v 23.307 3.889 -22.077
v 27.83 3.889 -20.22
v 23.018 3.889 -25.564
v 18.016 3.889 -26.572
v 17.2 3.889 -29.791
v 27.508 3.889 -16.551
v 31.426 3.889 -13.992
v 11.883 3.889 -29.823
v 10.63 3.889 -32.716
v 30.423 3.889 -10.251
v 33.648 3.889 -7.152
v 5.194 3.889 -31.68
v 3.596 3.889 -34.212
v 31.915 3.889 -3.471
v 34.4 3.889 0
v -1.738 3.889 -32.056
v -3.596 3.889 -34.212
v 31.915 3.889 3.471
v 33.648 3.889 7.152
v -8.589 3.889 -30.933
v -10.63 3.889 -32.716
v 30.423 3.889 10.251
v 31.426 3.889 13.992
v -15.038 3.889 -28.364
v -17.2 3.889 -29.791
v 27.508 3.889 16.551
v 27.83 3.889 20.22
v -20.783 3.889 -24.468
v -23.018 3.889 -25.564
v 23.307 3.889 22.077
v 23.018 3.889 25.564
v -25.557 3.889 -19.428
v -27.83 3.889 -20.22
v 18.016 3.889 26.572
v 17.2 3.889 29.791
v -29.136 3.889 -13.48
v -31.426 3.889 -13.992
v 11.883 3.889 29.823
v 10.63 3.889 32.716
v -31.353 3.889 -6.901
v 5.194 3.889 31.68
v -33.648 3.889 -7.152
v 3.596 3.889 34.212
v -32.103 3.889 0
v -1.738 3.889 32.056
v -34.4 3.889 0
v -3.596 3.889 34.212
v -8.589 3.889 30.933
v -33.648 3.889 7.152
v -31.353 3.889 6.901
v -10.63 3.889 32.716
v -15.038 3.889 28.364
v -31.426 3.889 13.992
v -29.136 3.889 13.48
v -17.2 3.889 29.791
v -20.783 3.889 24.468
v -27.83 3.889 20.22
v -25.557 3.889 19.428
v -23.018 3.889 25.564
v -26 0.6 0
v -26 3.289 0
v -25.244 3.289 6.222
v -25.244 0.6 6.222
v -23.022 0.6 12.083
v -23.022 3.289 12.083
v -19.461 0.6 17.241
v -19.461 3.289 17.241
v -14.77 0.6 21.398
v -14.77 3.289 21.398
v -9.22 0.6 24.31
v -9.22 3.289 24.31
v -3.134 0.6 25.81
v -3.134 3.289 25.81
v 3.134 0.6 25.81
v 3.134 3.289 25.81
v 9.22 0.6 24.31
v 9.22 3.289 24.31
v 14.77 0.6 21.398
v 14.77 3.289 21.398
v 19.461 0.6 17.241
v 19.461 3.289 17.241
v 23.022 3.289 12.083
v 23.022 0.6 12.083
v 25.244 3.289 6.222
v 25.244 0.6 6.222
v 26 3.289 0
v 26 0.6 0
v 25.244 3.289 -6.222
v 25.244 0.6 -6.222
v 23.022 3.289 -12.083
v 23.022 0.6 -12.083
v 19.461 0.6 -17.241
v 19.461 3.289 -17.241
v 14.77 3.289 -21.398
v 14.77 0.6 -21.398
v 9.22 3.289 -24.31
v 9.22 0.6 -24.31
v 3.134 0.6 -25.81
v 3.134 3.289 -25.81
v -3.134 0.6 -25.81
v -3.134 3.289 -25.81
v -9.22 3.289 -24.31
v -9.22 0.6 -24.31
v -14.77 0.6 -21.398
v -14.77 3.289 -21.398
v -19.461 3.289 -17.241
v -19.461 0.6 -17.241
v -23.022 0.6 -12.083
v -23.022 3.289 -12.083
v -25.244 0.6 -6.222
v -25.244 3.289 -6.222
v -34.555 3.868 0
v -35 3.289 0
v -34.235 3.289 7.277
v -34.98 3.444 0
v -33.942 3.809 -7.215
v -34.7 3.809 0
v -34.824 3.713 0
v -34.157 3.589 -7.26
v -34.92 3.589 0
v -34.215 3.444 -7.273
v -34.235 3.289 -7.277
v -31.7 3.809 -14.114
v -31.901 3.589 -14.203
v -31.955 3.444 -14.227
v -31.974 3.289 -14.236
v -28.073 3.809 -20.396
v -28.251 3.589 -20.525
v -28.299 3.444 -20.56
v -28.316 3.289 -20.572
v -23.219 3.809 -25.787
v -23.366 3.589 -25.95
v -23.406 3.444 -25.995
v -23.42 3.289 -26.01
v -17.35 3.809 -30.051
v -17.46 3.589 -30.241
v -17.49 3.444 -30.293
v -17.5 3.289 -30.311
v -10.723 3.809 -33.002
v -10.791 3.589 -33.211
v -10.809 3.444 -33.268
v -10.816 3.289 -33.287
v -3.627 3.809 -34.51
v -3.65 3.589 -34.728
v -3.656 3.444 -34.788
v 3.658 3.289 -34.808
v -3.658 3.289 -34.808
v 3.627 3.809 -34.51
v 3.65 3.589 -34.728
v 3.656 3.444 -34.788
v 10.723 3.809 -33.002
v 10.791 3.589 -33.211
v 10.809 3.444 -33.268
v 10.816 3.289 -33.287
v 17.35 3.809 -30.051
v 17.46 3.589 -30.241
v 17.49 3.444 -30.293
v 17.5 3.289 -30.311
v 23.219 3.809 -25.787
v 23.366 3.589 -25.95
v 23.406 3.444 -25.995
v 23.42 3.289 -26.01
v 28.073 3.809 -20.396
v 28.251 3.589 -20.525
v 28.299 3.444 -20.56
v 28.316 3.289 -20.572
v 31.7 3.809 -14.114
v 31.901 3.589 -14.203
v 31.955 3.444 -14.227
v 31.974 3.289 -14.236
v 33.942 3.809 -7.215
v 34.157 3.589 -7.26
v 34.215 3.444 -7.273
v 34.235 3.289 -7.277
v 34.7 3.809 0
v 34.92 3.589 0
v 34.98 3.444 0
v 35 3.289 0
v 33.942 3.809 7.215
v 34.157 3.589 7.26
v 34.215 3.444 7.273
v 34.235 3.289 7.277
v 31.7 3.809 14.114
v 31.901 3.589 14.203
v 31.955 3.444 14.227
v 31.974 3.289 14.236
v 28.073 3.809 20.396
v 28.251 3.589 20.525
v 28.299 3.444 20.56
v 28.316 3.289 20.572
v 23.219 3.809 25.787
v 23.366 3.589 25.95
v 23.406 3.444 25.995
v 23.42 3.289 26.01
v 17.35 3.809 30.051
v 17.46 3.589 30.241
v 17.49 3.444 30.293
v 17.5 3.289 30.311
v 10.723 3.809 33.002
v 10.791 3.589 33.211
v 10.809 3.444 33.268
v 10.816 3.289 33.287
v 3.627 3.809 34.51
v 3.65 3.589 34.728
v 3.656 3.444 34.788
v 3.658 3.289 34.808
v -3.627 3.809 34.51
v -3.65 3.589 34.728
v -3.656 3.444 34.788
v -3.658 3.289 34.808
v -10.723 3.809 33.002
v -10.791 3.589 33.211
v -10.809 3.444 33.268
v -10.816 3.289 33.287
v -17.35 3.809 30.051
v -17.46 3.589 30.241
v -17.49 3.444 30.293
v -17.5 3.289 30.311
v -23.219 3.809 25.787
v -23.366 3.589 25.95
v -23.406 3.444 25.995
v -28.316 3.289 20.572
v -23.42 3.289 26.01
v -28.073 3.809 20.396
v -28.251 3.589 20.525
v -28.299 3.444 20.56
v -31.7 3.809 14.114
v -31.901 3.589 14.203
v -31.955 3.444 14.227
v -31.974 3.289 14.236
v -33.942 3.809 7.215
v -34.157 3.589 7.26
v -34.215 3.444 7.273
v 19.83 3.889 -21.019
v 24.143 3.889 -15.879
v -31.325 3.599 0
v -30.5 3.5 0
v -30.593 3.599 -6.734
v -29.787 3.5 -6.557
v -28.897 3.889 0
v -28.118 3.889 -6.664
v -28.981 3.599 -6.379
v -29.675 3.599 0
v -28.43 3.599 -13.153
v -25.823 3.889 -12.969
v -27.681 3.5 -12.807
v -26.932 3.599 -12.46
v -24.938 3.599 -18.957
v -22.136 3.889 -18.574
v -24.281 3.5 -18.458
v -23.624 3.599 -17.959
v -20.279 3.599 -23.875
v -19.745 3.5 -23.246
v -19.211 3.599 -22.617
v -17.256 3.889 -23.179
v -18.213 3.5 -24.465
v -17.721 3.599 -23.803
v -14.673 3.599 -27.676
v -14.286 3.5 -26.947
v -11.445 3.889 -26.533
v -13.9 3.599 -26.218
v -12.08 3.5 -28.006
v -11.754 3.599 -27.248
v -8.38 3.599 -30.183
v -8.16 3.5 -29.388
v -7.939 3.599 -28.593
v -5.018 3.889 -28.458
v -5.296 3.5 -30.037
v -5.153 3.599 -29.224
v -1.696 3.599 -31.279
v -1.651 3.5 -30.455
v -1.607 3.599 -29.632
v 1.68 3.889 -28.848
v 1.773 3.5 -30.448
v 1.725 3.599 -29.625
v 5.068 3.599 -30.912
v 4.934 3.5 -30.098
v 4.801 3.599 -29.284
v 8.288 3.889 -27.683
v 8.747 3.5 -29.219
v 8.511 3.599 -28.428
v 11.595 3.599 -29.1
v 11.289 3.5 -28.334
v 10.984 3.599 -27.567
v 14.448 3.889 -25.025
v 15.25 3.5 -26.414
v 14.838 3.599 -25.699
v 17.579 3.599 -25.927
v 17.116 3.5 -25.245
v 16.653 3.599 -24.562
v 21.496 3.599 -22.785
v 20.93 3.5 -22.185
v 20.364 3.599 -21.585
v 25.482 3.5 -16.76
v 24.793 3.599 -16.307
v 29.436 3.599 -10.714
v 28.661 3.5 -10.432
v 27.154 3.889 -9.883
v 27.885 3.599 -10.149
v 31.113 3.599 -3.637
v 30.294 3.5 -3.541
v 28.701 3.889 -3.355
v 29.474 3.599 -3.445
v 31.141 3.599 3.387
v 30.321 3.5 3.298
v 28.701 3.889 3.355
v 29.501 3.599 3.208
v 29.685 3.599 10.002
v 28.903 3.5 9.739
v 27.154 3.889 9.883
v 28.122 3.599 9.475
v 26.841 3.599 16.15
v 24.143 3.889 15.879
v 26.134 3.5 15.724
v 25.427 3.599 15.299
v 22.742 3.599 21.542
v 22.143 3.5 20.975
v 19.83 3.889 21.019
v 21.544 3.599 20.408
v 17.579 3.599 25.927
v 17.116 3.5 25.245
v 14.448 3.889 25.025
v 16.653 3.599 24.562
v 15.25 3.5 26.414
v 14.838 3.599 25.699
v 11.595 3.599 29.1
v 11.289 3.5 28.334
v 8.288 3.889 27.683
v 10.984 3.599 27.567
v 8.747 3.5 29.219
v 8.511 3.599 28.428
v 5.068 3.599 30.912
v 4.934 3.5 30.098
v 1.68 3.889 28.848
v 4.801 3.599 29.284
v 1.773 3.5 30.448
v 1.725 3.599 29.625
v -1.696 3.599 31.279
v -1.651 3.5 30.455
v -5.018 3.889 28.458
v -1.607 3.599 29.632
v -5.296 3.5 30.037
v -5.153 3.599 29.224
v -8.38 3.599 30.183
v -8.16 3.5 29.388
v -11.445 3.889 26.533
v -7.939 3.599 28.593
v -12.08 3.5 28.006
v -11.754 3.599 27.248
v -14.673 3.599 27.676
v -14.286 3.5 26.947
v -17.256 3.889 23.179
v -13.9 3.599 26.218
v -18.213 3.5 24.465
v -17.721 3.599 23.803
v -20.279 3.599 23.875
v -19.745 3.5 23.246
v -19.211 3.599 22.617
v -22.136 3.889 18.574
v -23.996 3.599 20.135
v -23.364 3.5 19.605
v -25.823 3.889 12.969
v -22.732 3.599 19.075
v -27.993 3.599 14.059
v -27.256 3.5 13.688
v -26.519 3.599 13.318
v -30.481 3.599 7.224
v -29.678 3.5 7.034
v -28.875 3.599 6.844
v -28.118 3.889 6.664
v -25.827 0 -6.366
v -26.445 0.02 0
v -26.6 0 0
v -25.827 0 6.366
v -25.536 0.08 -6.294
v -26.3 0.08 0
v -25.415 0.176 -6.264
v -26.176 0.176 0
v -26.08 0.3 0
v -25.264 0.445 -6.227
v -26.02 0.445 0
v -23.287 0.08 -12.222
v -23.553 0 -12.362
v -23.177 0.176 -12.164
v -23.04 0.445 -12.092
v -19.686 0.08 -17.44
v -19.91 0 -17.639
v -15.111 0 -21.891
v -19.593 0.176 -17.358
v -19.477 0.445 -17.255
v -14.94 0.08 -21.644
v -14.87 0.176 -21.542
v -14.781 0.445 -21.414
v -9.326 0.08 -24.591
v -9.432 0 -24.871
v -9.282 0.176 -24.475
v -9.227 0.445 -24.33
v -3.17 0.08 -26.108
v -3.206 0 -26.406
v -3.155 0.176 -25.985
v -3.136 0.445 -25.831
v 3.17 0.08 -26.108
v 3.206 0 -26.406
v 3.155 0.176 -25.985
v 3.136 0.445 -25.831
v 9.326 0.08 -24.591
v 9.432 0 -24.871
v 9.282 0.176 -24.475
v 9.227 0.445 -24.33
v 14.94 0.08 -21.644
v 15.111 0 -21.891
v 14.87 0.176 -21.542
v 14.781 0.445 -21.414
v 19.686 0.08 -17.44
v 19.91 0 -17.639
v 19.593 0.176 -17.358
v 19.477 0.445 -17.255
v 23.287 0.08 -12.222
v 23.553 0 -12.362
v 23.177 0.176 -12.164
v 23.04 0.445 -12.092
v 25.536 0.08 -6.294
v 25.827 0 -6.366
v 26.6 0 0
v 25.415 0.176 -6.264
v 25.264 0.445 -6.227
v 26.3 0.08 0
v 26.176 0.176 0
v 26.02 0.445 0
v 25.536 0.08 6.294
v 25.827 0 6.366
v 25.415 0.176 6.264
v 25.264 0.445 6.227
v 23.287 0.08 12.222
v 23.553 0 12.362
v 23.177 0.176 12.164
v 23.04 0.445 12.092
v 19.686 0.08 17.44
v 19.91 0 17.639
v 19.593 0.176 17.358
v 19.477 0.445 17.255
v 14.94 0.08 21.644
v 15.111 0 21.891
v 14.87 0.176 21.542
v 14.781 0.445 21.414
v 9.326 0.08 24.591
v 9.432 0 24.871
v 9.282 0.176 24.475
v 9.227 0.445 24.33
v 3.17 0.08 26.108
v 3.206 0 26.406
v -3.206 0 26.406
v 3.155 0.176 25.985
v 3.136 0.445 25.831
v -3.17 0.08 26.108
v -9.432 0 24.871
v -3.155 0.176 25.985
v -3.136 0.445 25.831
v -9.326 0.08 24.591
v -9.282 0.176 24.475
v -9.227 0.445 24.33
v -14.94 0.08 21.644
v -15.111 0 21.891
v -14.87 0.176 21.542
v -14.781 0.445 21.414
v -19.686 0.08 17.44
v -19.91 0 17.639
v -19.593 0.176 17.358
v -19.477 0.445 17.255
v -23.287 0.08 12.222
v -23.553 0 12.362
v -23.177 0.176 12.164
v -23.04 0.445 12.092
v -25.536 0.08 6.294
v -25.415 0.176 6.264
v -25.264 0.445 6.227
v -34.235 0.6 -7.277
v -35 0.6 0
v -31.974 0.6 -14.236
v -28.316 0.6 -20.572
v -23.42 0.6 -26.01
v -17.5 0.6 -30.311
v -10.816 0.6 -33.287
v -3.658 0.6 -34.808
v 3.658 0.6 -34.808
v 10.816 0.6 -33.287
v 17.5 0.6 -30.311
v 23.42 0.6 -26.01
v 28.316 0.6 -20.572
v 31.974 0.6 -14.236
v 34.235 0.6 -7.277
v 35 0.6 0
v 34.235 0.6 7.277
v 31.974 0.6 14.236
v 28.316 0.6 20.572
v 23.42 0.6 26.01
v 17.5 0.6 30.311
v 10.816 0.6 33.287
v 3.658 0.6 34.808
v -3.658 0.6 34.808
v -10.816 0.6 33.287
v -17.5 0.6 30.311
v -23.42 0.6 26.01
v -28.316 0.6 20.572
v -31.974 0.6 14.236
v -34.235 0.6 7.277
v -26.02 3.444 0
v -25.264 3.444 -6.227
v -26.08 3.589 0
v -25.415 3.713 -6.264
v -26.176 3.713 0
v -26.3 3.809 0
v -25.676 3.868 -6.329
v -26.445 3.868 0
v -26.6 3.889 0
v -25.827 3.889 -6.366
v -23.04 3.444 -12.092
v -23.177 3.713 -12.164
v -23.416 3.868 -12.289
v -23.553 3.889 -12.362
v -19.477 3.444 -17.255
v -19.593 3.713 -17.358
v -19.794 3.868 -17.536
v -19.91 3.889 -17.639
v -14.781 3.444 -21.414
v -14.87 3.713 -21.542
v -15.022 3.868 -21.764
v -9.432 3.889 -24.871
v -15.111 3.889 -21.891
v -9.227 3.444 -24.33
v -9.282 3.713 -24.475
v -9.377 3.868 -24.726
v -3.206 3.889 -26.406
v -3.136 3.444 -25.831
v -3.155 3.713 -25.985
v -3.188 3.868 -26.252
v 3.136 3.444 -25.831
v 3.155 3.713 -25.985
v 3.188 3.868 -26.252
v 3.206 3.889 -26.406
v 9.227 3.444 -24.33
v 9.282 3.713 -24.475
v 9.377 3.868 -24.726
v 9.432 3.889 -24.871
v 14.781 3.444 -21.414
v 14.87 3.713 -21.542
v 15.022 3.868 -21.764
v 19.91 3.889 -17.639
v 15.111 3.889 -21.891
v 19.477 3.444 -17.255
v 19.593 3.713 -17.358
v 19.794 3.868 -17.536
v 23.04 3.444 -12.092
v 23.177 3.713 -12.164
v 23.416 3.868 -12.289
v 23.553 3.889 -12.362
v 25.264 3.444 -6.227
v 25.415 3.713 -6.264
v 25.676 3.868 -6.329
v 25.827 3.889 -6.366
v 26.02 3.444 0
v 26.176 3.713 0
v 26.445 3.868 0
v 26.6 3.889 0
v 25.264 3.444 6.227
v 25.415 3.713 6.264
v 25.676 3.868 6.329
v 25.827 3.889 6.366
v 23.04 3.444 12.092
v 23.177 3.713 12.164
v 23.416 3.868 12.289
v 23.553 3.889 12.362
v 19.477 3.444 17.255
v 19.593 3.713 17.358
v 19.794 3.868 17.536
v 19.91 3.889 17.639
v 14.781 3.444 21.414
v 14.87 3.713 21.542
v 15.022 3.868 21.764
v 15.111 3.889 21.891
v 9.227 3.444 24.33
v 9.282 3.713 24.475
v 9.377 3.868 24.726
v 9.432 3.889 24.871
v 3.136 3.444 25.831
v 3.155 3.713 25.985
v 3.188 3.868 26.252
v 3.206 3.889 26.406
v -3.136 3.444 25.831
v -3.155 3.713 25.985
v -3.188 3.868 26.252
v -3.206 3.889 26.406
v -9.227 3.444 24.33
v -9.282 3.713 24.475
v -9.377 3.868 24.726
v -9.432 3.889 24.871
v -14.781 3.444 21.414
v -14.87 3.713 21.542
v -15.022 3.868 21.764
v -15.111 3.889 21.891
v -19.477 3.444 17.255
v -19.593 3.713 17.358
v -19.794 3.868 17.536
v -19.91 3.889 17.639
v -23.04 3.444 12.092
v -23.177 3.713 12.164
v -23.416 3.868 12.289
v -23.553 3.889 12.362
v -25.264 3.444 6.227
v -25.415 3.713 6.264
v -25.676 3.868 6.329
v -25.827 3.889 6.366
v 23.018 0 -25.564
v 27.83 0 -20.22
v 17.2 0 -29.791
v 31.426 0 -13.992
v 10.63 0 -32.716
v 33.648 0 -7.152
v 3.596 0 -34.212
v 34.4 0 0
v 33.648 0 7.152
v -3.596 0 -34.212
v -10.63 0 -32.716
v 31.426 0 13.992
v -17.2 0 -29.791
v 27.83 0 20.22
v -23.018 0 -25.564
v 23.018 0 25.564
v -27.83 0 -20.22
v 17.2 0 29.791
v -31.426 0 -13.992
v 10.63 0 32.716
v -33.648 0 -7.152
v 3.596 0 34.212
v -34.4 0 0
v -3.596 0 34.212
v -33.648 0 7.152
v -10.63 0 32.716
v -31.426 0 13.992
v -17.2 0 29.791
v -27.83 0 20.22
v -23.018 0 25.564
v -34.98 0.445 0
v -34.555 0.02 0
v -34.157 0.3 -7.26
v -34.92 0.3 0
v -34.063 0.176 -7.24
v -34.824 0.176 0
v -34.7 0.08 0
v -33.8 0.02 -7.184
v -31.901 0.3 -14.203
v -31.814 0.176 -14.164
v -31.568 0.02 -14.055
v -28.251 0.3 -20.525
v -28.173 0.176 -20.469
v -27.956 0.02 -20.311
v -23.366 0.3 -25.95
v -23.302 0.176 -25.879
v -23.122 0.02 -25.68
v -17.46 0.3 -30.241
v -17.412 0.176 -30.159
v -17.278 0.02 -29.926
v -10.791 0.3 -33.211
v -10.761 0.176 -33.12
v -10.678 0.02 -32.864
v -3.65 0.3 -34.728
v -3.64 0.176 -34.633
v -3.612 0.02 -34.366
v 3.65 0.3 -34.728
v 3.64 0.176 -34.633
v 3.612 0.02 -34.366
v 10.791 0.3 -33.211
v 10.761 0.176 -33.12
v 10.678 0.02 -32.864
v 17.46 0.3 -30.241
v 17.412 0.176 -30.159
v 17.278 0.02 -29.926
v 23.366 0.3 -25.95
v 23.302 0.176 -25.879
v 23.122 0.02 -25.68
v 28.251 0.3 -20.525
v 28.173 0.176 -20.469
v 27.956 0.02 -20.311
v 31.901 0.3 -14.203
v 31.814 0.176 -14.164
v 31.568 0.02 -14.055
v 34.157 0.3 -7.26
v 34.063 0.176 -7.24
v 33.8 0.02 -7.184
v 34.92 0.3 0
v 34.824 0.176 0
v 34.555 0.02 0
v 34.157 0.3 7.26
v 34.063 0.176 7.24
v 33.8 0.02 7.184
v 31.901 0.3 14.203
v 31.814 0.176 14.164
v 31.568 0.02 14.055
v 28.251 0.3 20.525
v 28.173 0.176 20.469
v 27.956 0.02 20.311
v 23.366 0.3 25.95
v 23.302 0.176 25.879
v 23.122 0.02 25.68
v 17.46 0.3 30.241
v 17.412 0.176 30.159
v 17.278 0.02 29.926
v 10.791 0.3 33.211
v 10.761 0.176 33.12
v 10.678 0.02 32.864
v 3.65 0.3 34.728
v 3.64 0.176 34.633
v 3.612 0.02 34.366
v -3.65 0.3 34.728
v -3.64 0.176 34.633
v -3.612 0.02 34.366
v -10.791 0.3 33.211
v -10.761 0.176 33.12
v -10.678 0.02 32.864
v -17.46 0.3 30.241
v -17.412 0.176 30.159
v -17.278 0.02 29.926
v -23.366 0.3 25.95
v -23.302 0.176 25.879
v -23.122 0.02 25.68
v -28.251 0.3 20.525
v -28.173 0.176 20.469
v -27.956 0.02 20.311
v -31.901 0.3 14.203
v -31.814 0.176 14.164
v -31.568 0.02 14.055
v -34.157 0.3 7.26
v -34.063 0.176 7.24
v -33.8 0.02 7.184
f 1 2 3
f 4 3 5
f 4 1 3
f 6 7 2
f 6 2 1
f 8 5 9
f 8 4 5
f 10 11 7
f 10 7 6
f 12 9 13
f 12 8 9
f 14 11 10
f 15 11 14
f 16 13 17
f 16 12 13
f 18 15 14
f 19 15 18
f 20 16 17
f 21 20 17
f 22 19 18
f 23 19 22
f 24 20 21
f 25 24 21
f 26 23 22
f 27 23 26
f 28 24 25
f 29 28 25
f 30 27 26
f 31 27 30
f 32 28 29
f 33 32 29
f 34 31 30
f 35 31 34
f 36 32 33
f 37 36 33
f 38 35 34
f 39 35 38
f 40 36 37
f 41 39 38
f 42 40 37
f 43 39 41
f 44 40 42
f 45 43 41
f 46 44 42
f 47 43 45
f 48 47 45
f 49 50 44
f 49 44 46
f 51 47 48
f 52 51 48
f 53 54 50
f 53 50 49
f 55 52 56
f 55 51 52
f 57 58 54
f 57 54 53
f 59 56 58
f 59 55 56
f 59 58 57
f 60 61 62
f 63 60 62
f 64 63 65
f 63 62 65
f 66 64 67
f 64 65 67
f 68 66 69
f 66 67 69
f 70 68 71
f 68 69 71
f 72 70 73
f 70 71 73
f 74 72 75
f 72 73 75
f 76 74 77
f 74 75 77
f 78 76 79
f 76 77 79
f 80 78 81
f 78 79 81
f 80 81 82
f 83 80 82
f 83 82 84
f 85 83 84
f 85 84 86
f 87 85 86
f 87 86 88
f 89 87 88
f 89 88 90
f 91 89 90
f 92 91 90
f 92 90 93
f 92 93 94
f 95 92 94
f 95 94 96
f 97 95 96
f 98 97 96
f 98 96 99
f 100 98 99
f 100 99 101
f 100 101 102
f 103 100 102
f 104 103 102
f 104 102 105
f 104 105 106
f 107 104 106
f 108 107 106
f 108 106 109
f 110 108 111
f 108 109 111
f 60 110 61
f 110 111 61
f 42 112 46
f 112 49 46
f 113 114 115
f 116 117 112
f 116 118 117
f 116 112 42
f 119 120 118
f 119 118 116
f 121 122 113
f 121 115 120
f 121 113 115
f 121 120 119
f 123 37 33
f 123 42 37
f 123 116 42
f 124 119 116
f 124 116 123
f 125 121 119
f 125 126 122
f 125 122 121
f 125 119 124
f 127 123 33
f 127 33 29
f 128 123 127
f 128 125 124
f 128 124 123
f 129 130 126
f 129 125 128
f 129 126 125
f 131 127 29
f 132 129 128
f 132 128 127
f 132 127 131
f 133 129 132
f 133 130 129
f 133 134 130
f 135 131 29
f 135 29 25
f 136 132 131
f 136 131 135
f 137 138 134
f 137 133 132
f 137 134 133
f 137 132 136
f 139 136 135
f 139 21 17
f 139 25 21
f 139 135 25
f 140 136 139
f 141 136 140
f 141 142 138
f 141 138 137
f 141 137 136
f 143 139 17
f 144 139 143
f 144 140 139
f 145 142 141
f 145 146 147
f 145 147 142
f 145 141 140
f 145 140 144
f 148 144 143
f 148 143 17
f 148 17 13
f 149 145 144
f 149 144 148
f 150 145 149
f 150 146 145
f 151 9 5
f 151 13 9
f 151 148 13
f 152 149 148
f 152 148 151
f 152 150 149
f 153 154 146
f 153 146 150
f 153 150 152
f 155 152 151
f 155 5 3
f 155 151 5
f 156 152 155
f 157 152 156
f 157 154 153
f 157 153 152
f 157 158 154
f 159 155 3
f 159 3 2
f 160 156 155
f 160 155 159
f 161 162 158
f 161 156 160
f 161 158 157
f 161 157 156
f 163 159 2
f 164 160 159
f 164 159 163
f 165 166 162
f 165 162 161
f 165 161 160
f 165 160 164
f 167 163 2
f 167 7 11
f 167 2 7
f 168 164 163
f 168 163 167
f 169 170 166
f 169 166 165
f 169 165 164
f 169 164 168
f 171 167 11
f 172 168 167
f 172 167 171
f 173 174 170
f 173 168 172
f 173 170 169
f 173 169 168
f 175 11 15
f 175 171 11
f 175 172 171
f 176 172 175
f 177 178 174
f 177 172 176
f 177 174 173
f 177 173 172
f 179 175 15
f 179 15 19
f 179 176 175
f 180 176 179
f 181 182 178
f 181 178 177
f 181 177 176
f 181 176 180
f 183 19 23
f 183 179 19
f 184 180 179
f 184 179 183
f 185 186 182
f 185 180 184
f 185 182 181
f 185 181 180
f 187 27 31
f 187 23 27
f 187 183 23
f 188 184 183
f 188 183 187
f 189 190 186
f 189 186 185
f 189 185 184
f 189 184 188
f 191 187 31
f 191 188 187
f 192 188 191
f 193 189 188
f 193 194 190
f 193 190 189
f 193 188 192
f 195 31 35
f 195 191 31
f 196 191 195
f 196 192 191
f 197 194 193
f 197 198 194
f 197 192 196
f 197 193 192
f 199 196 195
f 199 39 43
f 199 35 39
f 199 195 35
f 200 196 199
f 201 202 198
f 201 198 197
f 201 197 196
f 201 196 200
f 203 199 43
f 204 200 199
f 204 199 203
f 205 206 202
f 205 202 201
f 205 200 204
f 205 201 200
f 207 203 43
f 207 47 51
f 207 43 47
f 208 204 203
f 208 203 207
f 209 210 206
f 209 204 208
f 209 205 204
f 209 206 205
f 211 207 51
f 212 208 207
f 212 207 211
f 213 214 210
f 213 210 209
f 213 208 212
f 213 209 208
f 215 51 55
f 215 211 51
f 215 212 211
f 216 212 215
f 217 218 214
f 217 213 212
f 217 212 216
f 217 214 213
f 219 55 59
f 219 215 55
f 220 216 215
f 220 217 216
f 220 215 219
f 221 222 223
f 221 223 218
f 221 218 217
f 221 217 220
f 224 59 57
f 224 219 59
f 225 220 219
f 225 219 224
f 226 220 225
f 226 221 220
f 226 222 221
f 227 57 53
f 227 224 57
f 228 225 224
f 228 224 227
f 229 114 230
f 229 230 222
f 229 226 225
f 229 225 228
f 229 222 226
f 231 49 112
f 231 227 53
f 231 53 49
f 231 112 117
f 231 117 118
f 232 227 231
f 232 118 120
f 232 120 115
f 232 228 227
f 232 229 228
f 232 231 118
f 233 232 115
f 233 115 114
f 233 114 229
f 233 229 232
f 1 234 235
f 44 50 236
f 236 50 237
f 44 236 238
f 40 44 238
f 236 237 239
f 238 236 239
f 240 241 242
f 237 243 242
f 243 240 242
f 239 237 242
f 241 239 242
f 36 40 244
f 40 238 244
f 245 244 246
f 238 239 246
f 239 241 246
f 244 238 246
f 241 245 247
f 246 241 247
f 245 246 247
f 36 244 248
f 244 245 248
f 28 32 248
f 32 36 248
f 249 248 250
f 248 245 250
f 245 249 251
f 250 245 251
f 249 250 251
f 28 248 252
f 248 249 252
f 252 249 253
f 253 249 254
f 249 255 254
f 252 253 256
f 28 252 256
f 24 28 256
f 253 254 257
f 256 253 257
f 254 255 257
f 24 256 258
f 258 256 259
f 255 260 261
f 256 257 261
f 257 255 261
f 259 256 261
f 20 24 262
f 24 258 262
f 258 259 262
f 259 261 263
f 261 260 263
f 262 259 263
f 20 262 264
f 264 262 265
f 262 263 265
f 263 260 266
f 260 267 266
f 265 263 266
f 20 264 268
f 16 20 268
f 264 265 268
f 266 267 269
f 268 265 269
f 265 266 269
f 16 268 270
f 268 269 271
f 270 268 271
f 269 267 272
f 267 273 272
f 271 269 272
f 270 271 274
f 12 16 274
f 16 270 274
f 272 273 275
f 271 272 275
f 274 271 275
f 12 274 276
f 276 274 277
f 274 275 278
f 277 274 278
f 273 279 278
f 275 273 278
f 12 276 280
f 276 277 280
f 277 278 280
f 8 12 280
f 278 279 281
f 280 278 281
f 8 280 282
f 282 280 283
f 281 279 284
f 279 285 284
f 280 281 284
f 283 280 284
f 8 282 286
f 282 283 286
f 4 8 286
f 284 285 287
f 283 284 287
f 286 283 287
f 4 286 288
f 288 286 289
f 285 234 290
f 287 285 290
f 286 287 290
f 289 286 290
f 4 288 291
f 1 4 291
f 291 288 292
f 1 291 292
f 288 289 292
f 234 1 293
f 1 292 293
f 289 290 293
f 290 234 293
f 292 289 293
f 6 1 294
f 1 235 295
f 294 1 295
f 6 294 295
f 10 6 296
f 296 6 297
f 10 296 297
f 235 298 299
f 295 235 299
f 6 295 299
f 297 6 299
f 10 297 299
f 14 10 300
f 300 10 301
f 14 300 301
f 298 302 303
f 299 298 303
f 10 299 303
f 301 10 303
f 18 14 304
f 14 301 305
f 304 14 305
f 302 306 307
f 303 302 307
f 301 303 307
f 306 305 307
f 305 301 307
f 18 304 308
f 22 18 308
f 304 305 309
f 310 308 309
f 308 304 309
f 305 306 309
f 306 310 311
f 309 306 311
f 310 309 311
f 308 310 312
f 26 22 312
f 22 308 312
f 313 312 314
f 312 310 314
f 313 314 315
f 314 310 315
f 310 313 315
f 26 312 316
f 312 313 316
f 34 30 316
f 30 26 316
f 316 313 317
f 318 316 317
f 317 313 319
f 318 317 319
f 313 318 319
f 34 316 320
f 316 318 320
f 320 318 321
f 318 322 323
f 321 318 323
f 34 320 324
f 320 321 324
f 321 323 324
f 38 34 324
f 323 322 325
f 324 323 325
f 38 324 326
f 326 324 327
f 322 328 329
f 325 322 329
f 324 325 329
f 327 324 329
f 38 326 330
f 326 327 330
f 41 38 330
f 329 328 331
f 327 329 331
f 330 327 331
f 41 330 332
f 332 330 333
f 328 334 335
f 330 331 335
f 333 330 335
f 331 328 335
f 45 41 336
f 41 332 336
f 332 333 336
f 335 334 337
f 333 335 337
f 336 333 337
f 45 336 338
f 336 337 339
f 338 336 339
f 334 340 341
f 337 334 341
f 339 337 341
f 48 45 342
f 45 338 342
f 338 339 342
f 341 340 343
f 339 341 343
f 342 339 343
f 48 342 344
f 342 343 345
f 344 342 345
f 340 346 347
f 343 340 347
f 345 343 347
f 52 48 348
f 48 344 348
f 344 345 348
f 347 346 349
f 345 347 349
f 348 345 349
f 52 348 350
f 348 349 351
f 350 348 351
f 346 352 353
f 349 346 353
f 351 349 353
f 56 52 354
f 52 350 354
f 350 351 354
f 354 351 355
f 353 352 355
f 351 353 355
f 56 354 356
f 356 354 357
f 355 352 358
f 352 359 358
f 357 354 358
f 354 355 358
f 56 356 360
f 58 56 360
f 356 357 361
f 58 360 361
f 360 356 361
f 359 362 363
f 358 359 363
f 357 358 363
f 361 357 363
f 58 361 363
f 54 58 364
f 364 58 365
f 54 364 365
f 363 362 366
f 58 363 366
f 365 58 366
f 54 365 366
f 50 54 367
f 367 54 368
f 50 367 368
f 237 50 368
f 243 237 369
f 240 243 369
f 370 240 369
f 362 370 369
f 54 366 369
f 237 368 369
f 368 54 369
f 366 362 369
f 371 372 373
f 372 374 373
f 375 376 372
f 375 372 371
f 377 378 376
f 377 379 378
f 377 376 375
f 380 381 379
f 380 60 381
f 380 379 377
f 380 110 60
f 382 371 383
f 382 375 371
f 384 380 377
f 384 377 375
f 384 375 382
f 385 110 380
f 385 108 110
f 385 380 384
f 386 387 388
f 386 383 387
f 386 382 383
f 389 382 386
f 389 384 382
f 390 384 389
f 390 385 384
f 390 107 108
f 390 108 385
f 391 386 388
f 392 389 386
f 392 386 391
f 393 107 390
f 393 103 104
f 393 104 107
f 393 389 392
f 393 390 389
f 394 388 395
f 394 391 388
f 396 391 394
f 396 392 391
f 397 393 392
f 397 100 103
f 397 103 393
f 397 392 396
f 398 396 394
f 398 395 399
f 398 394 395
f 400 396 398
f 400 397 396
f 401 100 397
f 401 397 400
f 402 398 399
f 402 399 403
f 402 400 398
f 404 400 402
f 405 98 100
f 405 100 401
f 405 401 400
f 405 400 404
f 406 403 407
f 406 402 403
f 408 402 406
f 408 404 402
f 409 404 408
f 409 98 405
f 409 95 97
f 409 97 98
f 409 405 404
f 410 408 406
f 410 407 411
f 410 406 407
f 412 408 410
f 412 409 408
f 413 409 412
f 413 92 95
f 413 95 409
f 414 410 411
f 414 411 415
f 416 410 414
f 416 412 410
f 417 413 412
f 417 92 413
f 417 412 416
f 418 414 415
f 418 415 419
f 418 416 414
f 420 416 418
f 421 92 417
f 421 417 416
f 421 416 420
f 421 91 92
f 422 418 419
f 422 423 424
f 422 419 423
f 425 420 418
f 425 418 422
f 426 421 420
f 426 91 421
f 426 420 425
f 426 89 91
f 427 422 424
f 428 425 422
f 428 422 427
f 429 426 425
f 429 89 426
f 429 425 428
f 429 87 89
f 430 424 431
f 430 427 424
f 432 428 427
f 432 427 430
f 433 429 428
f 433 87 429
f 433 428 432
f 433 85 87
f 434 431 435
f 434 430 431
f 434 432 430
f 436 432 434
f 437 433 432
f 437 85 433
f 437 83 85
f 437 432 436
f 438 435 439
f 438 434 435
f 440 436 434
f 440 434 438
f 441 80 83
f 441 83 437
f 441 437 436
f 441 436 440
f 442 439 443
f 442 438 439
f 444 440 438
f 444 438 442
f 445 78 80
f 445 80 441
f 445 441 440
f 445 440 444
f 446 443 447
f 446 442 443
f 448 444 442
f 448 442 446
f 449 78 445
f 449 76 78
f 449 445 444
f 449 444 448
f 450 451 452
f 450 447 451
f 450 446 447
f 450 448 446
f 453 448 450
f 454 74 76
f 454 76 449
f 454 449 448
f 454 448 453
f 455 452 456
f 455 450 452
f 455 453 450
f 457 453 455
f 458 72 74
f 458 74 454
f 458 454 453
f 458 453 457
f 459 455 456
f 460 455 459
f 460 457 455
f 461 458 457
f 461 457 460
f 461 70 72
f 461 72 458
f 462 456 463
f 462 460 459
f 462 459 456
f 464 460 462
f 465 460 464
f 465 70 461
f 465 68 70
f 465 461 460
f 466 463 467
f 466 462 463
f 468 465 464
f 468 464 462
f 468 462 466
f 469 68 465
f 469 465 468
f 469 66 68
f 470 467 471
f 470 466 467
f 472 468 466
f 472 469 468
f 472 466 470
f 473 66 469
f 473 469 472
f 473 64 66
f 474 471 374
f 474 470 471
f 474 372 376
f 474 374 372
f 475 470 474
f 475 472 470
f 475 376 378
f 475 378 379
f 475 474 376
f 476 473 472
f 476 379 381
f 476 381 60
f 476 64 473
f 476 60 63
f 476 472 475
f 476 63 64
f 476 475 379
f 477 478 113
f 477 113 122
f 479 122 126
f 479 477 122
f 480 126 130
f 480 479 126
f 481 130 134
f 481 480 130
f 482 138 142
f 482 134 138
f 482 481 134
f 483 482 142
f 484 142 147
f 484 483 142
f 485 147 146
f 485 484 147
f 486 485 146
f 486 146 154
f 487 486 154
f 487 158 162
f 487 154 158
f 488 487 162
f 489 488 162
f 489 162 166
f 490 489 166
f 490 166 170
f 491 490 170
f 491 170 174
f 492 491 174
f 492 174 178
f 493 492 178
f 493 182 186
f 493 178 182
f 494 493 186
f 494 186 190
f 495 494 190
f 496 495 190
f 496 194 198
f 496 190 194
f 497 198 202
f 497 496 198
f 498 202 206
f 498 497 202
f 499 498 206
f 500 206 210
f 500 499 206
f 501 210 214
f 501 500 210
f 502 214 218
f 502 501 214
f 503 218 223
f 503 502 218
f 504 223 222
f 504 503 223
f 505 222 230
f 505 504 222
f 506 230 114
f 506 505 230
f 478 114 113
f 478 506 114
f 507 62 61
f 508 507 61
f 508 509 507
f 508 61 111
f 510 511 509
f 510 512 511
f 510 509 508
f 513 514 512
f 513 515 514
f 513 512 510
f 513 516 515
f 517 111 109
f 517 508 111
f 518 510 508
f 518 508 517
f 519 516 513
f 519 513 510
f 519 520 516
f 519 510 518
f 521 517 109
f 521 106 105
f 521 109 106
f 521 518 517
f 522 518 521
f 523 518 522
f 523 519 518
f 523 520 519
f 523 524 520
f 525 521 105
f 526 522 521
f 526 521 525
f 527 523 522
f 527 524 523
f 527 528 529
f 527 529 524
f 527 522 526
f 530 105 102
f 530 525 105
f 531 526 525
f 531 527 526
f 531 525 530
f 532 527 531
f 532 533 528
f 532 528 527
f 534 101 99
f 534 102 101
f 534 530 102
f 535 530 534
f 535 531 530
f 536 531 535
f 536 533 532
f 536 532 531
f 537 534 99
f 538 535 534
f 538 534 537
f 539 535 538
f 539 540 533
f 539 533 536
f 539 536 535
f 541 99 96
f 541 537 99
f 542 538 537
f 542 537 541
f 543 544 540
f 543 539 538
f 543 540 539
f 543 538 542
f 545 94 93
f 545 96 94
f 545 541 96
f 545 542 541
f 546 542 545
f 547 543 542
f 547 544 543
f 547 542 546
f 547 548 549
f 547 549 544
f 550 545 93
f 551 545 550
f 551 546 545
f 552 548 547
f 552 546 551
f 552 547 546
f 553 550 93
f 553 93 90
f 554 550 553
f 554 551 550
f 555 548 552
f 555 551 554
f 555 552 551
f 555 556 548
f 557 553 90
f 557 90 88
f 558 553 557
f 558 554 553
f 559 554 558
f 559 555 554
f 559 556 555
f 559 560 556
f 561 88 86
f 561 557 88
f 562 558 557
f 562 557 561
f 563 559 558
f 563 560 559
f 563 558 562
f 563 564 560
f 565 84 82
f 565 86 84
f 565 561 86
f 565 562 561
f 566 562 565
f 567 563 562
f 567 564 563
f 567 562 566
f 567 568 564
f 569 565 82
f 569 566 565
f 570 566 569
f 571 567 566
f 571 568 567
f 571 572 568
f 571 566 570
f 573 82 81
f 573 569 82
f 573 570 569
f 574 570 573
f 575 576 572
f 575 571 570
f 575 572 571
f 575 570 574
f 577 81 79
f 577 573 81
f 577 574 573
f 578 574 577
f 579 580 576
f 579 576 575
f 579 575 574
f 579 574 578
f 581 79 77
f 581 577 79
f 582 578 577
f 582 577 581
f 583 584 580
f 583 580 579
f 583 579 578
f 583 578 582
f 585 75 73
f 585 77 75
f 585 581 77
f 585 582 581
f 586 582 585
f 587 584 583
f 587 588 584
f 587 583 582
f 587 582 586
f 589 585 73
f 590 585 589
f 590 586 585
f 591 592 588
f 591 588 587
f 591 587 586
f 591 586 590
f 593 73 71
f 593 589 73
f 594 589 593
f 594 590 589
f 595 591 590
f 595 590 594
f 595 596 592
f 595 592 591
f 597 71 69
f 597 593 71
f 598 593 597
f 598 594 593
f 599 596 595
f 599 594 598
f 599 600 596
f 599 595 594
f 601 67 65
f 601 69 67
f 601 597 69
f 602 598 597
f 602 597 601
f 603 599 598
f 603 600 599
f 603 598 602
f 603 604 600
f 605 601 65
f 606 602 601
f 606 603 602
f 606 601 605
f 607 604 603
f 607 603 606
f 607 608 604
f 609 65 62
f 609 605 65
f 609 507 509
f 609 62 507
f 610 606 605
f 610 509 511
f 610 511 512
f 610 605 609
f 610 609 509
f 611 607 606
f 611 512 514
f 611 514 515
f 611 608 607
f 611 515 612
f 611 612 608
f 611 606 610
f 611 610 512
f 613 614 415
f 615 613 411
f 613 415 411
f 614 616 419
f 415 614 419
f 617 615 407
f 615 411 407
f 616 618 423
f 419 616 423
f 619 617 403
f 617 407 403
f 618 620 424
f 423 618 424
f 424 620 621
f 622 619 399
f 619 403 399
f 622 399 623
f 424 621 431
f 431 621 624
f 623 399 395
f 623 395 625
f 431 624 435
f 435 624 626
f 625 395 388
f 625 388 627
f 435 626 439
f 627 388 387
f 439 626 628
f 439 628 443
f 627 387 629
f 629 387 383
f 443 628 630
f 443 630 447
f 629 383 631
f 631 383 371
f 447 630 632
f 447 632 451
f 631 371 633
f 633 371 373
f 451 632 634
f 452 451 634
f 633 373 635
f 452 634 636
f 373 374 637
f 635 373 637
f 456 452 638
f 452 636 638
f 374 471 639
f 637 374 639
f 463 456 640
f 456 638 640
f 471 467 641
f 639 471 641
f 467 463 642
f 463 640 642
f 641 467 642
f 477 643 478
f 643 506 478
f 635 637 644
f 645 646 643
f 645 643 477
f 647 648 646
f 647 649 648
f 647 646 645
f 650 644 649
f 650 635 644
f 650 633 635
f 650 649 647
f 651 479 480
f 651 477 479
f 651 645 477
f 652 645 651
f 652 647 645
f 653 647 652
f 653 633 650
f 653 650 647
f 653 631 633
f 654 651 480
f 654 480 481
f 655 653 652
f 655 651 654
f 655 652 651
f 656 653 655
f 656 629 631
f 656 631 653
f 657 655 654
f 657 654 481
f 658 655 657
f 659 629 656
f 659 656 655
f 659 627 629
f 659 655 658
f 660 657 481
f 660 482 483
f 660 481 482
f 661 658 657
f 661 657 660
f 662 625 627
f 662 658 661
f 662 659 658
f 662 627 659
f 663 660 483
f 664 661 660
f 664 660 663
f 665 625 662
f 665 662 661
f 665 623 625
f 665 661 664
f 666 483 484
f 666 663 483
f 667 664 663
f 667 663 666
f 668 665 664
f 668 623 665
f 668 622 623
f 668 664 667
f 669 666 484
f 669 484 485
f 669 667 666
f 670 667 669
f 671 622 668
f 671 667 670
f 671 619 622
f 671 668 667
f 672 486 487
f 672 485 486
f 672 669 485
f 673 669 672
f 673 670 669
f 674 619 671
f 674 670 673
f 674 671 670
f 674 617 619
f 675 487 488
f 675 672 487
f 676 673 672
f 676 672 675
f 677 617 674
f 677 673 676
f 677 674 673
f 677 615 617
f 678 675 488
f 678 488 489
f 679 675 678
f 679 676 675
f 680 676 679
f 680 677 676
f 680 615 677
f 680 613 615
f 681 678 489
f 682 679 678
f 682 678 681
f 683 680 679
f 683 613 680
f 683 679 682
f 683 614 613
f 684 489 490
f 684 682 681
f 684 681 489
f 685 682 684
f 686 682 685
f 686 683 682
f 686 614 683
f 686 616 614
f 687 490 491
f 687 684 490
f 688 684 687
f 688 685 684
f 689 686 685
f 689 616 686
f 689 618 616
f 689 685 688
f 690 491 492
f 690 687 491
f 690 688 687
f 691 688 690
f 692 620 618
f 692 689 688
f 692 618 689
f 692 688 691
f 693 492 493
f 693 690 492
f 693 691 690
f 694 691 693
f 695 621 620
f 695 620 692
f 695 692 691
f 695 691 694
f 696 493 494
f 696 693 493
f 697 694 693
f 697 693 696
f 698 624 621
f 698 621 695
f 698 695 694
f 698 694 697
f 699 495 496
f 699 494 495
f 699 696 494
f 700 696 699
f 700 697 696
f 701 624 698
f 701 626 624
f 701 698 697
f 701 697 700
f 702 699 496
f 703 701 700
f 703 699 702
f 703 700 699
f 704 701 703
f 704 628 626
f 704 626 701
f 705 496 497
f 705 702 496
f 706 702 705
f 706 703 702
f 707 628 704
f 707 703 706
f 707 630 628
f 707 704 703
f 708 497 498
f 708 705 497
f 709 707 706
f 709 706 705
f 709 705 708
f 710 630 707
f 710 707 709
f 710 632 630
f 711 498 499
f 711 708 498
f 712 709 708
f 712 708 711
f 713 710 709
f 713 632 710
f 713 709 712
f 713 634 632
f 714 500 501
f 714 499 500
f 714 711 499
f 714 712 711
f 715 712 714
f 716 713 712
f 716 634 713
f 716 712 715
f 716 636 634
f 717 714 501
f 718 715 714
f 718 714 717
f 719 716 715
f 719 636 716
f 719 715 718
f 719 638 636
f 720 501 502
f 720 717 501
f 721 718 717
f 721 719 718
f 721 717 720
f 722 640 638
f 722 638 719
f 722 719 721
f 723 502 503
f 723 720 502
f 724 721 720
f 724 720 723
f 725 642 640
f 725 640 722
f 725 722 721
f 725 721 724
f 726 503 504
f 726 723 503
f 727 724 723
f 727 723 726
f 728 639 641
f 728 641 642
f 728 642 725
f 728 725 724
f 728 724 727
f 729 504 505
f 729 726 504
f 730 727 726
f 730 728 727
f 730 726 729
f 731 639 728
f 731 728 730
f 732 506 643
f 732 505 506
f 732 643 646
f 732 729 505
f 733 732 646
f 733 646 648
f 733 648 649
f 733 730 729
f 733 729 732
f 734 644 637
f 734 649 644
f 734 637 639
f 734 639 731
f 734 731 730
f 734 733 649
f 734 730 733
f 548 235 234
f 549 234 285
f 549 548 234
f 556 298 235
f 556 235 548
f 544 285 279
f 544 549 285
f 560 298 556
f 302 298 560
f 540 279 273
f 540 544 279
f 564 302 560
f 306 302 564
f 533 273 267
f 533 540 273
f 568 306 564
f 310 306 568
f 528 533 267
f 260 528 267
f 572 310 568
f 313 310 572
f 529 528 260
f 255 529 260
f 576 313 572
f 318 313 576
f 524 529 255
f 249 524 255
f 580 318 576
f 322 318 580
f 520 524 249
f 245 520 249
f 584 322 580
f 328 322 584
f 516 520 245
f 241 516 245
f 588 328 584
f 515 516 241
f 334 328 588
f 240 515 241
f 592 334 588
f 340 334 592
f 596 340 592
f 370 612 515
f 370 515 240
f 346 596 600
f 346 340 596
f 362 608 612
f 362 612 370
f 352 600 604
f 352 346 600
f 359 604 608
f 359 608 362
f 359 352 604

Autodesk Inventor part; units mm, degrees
sketch "Sketch_1" plane through (0, 0, 0) normal (0, 0, 1) x (0, 1, 0)
  line L0 (3.8889, 0) -> (0, 0)
  arc A0 (0, 26.6) -> (0.6, 26) centre (0.6, 26.6) ccw
  line L1 (0.6, 26) -> (3.2889, 26)
  arc A1 (3.2889, 26) -> (3.8889, 26.6) centre (3.2889, 26.6) ccw
  line L2 (3.8889, 26.6) -> (3.8889, 28.8966)
  arc A2 (3.8889, 32.1034) -> (3.8889, 28.8966) centre (7, 30.5) ccw
  line L3 (3.8889, 32.1034) -> (3.8889, 34.4)
  arc A3 (3.8889, 34.4) -> (3.2889, 35) centre (3.2889, 34.4) ccw
  line L4 (3.2889, 35) -> (0.6, 35)
  arc A4 (0.6, 35) -> (0, 34.4) centre (0.6, 34.4) ccw
  line L5 (0, 34.4) -> (0, 26.6)
revolve "Revolution1" add sketch "Sketch_1" angle 360 about axis through (0, 3.8889, 0) along (0, 1, 0)
ref_plane "HW_B_1_XY" through (-30.5, 7, 0) normal (0, 1, 0) x (0, 0, -1)
ref_plane "HW_B_1_YZ" through (-30.5, 7, 0) normal (0, 0, -1) x (-1, 0, 0)
ref_plane "HW_B_1_ZX" through (-30.5, 7, 0) normal (-1, 0, 0) x (0, 1, 0)
ref_plane "HW_B_10_XY" through (30.5, 7, 0) normal (0, 1, 0) x (0, 0, -1)
ref_plane "HW_B_10_YZ" through (30.5, 7, 0) normal (0, 0, -1) x (-1, 0, 0)
ref_plane "HW_B_10_ZX" through (30.5, 7, 0) normal (-1, 0, 0) x (0, 1, 0)
ref_plane "HW_B_11_XY" through (28.6606, 7, -10.4316) normal (0, 1, 0) x (0, 0, -1)
ref_plane "HW_B_11_YZ" through (28.6606, 7, -10.4316) normal (0, 0, -1) x (-1, 0, 0)
ref_plane "HW_B_11_ZX" through (28.6606, 7, -10.4316) normal (-1, 0, 0) x (0, 1, 0)
ref_plane "HW_B_12_XY" through (23.3644, 7, -19.605) normal (0, 1, 0) x (0, 0, -1)
ref_plane "HW_B_12_YZ" through (23.3644, 7, -19.605) normal (0, 0, -1) x (-1, 0, 0)
ref_plane "HW_B_12_ZX" through (23.3644, 7, -19.605) normal (-1, 0, 0) x (0, 1, 0)
ref_plane "HW_B_13_XY" through (15.25, 7, -26.4138) normal (0, 1, 0) x (0, 0, -1)
ref_plane "HW_B_13_YZ" through (15.25, 7, -26.4138) normal (0, 0, -1) x (-1, 0, 0)
ref_plane "HW_B_13_ZX" through (15.25, 7, -26.4138) normal (-1, 0, 0) x (0, 1, 0)
ref_plane "HW_B_14_XY" through (5.2963, 7, -30.0366) normal (0, 1, 0) x (0, 0, -1)
ref_plane "HW_B_14_YZ" through (5.2963, 7, -30.0366) normal (0, 0, -1) x (-1, 0, 0)
ref_plane "HW_B_14_ZX" through (5.2963, 7, -30.0366) normal (-1, 0, 0) x (0, 1, 0)
ref_plane "HW_B_15_XY" through (-5.2963, 7, -30.0366) normal (0, 1, 0) x (0, 0, -1)
ref_plane "HW_B_15_YZ" through (-5.2963, 7, -30.0366) normal (0, 0, -1) x (-1, 0, 0)
ref_plane "HW_B_15_ZX" through (-5.2963, 7, -30.0366) normal (-1, 0, 0) x (0, 1, 0)
ref_plane "HW_B_16_XY" through (-15.25, 7, -26.4138) normal (0, 1, 0) x (0, 0, -1)
ref_plane "HW_B_16_YZ" through (-15.25, 7, -26.4138) normal (0, 0, -1) x (-1, 0, 0)
ref_plane "HW_B_16_ZX" through (-15.25, 7, -26.4138) normal (-1, 0, 0) x (0, 1, 0)
ref_plane "HW_B_17_XY" through (-23.3644, 7, -19.605) normal (0, 1, 0) x (0, 0, -1)
ref_plane "HW_B_17_YZ" through (-23.3644, 7, -19.605) normal (0, 0, -1) x (-1, 0, 0)
ref_plane "HW_B_17_ZX" through (-23.3644, 7, -19.605) normal (-1, 0, 0) x (0, 1, 0)
ref_plane "HW_B_18_XY" through (-28.6606, 7, -10.4316) normal (0, 1, 0) x (0, 0, -1)
ref_plane "HW_B_18_YZ" through (-28.6606, 7, -10.4316) normal (0, 0, -1) x (-1, 0, 0)
ref_plane "HW_B_18_ZX" through (-28.6606, 7, -10.4316) normal (-1, 0, 0) x (0, 1, 0)
ref_plane "HW_B_2_XY" through (-28.6606, 7, 10.4316) normal (0, 1, 0) x (0, 0, -1)
ref_plane "HW_B_2_YZ" through (-28.6606, 7, 10.4316) normal (0, 0, -1) x (-1, 0, 0)
ref_plane "HW_B_2_ZX" through (-28.6606, 7, 10.4316) normal (-1, 0, 0) x (0, 1, 0)
ref_plane "HW_B_3_XY" through (-23.3644, 7, 19.605) normal (0, 1, 0) x (0, 0, -1)
ref_plane "HW_B_3_YZ" through (-23.3644, 7, 19.605) normal (0, 0, -1) x (-1, 0, 0)
ref_plane "HW_B_3_ZX" through (-23.3644, 7, 19.605) normal (-1, 0, 0) x (0, 1, 0)
ref_plane "HW_B_4_XY" through (-15.25, 7, 26.4138) normal (0, 1, 0) x (0, 0, -1)
ref_plane "HW_B_4_YZ" through (-15.25, 7, 26.4138) normal (0, 0, -1) x (-1, 0, 0)
ref_plane "HW_B_4_ZX" through (-15.25, 7, 26.4138) normal (-1, 0, 0) x (0, 1, 0)
ref_plane "HW_B_5_XY" through (-5.2963, 7, 30.0366) normal (0, 1, 0) x (0, 0, -1)
ref_plane "HW_B_5_YZ" through (-5.2963, 7, 30.0366) normal (0, 0, -1) x (-1, 0, 0)
ref_plane "HW_B_5_ZX" through (-5.2963, 7, 30.0366) normal (-1, 0, 0) x (0, 1, 0)
ref_plane "HW_B_6_XY" through (5.2963, 7, 30.0366) normal (0, 1, 0) x (0, 0, -1)
ref_plane "HW_B_6_YZ" through (5.2963, 7, 30.0366) normal (0, 0, -1) x (-1, 0, 0)
ref_plane "HW_B_6_ZX" through (5.2963, 7, 30.0366) normal (-1, 0, 0) x (0, 1, 0)
ref_plane "HW_B_7_XY" through (15.25, 7, 26.4138) normal (0, 1, 0) x (0, 0, -1)
ref_plane "HW_B_7_YZ" through (15.25, 7, 26.4138) normal (0, 0, -1) x (-1, 0, 0)
ref_plane "HW_B_7_ZX" through (15.25, 7, 26.4138) normal (-1, 0, 0) x (0, 1, 0)
ref_plane "HW_B_8_XY" through (23.3644, 7, 19.605) normal (0, 1, 0) x (0, 0, -1)
ref_plane "HW_B_8_YZ" through (23.3644, 7, 19.605) normal (0, 0, -1) x (-1, 0, 0)
ref_plane "HW_B_8_ZX" through (23.3644, 7, 19.605) normal (-1, 0, 0) x (0, 1, 0)
ref_plane "HW_B_9_XY" through (28.6606, 7, 10.4316) normal (0, 1, 0) x (0, 0, -1)
ref_plane "HW_B_9_YZ" through (28.6606, 7, 10.4316) normal (0, 0, -1) x (-1, 0, 0)
ref_plane "HW_B_9_ZX" through (28.6606, 7, 10.4316) normal (-1, 0, 0) x (0, 1, 0)
ref_plane "HW_SW_XY" through (0, 0, 0) normal (0, 1, 0) x (0, 0, -1)
ref_plane "HW_SW_YZ" through (0, 0, 0) normal (0, 0, -1) x (-1, 0, 0)
ref_plane "HW_SW_ZX" through (0, 0, 0) normal (-1, 0, 0) x (0, 1, 0)
properties part number "51110 Housing washer"
